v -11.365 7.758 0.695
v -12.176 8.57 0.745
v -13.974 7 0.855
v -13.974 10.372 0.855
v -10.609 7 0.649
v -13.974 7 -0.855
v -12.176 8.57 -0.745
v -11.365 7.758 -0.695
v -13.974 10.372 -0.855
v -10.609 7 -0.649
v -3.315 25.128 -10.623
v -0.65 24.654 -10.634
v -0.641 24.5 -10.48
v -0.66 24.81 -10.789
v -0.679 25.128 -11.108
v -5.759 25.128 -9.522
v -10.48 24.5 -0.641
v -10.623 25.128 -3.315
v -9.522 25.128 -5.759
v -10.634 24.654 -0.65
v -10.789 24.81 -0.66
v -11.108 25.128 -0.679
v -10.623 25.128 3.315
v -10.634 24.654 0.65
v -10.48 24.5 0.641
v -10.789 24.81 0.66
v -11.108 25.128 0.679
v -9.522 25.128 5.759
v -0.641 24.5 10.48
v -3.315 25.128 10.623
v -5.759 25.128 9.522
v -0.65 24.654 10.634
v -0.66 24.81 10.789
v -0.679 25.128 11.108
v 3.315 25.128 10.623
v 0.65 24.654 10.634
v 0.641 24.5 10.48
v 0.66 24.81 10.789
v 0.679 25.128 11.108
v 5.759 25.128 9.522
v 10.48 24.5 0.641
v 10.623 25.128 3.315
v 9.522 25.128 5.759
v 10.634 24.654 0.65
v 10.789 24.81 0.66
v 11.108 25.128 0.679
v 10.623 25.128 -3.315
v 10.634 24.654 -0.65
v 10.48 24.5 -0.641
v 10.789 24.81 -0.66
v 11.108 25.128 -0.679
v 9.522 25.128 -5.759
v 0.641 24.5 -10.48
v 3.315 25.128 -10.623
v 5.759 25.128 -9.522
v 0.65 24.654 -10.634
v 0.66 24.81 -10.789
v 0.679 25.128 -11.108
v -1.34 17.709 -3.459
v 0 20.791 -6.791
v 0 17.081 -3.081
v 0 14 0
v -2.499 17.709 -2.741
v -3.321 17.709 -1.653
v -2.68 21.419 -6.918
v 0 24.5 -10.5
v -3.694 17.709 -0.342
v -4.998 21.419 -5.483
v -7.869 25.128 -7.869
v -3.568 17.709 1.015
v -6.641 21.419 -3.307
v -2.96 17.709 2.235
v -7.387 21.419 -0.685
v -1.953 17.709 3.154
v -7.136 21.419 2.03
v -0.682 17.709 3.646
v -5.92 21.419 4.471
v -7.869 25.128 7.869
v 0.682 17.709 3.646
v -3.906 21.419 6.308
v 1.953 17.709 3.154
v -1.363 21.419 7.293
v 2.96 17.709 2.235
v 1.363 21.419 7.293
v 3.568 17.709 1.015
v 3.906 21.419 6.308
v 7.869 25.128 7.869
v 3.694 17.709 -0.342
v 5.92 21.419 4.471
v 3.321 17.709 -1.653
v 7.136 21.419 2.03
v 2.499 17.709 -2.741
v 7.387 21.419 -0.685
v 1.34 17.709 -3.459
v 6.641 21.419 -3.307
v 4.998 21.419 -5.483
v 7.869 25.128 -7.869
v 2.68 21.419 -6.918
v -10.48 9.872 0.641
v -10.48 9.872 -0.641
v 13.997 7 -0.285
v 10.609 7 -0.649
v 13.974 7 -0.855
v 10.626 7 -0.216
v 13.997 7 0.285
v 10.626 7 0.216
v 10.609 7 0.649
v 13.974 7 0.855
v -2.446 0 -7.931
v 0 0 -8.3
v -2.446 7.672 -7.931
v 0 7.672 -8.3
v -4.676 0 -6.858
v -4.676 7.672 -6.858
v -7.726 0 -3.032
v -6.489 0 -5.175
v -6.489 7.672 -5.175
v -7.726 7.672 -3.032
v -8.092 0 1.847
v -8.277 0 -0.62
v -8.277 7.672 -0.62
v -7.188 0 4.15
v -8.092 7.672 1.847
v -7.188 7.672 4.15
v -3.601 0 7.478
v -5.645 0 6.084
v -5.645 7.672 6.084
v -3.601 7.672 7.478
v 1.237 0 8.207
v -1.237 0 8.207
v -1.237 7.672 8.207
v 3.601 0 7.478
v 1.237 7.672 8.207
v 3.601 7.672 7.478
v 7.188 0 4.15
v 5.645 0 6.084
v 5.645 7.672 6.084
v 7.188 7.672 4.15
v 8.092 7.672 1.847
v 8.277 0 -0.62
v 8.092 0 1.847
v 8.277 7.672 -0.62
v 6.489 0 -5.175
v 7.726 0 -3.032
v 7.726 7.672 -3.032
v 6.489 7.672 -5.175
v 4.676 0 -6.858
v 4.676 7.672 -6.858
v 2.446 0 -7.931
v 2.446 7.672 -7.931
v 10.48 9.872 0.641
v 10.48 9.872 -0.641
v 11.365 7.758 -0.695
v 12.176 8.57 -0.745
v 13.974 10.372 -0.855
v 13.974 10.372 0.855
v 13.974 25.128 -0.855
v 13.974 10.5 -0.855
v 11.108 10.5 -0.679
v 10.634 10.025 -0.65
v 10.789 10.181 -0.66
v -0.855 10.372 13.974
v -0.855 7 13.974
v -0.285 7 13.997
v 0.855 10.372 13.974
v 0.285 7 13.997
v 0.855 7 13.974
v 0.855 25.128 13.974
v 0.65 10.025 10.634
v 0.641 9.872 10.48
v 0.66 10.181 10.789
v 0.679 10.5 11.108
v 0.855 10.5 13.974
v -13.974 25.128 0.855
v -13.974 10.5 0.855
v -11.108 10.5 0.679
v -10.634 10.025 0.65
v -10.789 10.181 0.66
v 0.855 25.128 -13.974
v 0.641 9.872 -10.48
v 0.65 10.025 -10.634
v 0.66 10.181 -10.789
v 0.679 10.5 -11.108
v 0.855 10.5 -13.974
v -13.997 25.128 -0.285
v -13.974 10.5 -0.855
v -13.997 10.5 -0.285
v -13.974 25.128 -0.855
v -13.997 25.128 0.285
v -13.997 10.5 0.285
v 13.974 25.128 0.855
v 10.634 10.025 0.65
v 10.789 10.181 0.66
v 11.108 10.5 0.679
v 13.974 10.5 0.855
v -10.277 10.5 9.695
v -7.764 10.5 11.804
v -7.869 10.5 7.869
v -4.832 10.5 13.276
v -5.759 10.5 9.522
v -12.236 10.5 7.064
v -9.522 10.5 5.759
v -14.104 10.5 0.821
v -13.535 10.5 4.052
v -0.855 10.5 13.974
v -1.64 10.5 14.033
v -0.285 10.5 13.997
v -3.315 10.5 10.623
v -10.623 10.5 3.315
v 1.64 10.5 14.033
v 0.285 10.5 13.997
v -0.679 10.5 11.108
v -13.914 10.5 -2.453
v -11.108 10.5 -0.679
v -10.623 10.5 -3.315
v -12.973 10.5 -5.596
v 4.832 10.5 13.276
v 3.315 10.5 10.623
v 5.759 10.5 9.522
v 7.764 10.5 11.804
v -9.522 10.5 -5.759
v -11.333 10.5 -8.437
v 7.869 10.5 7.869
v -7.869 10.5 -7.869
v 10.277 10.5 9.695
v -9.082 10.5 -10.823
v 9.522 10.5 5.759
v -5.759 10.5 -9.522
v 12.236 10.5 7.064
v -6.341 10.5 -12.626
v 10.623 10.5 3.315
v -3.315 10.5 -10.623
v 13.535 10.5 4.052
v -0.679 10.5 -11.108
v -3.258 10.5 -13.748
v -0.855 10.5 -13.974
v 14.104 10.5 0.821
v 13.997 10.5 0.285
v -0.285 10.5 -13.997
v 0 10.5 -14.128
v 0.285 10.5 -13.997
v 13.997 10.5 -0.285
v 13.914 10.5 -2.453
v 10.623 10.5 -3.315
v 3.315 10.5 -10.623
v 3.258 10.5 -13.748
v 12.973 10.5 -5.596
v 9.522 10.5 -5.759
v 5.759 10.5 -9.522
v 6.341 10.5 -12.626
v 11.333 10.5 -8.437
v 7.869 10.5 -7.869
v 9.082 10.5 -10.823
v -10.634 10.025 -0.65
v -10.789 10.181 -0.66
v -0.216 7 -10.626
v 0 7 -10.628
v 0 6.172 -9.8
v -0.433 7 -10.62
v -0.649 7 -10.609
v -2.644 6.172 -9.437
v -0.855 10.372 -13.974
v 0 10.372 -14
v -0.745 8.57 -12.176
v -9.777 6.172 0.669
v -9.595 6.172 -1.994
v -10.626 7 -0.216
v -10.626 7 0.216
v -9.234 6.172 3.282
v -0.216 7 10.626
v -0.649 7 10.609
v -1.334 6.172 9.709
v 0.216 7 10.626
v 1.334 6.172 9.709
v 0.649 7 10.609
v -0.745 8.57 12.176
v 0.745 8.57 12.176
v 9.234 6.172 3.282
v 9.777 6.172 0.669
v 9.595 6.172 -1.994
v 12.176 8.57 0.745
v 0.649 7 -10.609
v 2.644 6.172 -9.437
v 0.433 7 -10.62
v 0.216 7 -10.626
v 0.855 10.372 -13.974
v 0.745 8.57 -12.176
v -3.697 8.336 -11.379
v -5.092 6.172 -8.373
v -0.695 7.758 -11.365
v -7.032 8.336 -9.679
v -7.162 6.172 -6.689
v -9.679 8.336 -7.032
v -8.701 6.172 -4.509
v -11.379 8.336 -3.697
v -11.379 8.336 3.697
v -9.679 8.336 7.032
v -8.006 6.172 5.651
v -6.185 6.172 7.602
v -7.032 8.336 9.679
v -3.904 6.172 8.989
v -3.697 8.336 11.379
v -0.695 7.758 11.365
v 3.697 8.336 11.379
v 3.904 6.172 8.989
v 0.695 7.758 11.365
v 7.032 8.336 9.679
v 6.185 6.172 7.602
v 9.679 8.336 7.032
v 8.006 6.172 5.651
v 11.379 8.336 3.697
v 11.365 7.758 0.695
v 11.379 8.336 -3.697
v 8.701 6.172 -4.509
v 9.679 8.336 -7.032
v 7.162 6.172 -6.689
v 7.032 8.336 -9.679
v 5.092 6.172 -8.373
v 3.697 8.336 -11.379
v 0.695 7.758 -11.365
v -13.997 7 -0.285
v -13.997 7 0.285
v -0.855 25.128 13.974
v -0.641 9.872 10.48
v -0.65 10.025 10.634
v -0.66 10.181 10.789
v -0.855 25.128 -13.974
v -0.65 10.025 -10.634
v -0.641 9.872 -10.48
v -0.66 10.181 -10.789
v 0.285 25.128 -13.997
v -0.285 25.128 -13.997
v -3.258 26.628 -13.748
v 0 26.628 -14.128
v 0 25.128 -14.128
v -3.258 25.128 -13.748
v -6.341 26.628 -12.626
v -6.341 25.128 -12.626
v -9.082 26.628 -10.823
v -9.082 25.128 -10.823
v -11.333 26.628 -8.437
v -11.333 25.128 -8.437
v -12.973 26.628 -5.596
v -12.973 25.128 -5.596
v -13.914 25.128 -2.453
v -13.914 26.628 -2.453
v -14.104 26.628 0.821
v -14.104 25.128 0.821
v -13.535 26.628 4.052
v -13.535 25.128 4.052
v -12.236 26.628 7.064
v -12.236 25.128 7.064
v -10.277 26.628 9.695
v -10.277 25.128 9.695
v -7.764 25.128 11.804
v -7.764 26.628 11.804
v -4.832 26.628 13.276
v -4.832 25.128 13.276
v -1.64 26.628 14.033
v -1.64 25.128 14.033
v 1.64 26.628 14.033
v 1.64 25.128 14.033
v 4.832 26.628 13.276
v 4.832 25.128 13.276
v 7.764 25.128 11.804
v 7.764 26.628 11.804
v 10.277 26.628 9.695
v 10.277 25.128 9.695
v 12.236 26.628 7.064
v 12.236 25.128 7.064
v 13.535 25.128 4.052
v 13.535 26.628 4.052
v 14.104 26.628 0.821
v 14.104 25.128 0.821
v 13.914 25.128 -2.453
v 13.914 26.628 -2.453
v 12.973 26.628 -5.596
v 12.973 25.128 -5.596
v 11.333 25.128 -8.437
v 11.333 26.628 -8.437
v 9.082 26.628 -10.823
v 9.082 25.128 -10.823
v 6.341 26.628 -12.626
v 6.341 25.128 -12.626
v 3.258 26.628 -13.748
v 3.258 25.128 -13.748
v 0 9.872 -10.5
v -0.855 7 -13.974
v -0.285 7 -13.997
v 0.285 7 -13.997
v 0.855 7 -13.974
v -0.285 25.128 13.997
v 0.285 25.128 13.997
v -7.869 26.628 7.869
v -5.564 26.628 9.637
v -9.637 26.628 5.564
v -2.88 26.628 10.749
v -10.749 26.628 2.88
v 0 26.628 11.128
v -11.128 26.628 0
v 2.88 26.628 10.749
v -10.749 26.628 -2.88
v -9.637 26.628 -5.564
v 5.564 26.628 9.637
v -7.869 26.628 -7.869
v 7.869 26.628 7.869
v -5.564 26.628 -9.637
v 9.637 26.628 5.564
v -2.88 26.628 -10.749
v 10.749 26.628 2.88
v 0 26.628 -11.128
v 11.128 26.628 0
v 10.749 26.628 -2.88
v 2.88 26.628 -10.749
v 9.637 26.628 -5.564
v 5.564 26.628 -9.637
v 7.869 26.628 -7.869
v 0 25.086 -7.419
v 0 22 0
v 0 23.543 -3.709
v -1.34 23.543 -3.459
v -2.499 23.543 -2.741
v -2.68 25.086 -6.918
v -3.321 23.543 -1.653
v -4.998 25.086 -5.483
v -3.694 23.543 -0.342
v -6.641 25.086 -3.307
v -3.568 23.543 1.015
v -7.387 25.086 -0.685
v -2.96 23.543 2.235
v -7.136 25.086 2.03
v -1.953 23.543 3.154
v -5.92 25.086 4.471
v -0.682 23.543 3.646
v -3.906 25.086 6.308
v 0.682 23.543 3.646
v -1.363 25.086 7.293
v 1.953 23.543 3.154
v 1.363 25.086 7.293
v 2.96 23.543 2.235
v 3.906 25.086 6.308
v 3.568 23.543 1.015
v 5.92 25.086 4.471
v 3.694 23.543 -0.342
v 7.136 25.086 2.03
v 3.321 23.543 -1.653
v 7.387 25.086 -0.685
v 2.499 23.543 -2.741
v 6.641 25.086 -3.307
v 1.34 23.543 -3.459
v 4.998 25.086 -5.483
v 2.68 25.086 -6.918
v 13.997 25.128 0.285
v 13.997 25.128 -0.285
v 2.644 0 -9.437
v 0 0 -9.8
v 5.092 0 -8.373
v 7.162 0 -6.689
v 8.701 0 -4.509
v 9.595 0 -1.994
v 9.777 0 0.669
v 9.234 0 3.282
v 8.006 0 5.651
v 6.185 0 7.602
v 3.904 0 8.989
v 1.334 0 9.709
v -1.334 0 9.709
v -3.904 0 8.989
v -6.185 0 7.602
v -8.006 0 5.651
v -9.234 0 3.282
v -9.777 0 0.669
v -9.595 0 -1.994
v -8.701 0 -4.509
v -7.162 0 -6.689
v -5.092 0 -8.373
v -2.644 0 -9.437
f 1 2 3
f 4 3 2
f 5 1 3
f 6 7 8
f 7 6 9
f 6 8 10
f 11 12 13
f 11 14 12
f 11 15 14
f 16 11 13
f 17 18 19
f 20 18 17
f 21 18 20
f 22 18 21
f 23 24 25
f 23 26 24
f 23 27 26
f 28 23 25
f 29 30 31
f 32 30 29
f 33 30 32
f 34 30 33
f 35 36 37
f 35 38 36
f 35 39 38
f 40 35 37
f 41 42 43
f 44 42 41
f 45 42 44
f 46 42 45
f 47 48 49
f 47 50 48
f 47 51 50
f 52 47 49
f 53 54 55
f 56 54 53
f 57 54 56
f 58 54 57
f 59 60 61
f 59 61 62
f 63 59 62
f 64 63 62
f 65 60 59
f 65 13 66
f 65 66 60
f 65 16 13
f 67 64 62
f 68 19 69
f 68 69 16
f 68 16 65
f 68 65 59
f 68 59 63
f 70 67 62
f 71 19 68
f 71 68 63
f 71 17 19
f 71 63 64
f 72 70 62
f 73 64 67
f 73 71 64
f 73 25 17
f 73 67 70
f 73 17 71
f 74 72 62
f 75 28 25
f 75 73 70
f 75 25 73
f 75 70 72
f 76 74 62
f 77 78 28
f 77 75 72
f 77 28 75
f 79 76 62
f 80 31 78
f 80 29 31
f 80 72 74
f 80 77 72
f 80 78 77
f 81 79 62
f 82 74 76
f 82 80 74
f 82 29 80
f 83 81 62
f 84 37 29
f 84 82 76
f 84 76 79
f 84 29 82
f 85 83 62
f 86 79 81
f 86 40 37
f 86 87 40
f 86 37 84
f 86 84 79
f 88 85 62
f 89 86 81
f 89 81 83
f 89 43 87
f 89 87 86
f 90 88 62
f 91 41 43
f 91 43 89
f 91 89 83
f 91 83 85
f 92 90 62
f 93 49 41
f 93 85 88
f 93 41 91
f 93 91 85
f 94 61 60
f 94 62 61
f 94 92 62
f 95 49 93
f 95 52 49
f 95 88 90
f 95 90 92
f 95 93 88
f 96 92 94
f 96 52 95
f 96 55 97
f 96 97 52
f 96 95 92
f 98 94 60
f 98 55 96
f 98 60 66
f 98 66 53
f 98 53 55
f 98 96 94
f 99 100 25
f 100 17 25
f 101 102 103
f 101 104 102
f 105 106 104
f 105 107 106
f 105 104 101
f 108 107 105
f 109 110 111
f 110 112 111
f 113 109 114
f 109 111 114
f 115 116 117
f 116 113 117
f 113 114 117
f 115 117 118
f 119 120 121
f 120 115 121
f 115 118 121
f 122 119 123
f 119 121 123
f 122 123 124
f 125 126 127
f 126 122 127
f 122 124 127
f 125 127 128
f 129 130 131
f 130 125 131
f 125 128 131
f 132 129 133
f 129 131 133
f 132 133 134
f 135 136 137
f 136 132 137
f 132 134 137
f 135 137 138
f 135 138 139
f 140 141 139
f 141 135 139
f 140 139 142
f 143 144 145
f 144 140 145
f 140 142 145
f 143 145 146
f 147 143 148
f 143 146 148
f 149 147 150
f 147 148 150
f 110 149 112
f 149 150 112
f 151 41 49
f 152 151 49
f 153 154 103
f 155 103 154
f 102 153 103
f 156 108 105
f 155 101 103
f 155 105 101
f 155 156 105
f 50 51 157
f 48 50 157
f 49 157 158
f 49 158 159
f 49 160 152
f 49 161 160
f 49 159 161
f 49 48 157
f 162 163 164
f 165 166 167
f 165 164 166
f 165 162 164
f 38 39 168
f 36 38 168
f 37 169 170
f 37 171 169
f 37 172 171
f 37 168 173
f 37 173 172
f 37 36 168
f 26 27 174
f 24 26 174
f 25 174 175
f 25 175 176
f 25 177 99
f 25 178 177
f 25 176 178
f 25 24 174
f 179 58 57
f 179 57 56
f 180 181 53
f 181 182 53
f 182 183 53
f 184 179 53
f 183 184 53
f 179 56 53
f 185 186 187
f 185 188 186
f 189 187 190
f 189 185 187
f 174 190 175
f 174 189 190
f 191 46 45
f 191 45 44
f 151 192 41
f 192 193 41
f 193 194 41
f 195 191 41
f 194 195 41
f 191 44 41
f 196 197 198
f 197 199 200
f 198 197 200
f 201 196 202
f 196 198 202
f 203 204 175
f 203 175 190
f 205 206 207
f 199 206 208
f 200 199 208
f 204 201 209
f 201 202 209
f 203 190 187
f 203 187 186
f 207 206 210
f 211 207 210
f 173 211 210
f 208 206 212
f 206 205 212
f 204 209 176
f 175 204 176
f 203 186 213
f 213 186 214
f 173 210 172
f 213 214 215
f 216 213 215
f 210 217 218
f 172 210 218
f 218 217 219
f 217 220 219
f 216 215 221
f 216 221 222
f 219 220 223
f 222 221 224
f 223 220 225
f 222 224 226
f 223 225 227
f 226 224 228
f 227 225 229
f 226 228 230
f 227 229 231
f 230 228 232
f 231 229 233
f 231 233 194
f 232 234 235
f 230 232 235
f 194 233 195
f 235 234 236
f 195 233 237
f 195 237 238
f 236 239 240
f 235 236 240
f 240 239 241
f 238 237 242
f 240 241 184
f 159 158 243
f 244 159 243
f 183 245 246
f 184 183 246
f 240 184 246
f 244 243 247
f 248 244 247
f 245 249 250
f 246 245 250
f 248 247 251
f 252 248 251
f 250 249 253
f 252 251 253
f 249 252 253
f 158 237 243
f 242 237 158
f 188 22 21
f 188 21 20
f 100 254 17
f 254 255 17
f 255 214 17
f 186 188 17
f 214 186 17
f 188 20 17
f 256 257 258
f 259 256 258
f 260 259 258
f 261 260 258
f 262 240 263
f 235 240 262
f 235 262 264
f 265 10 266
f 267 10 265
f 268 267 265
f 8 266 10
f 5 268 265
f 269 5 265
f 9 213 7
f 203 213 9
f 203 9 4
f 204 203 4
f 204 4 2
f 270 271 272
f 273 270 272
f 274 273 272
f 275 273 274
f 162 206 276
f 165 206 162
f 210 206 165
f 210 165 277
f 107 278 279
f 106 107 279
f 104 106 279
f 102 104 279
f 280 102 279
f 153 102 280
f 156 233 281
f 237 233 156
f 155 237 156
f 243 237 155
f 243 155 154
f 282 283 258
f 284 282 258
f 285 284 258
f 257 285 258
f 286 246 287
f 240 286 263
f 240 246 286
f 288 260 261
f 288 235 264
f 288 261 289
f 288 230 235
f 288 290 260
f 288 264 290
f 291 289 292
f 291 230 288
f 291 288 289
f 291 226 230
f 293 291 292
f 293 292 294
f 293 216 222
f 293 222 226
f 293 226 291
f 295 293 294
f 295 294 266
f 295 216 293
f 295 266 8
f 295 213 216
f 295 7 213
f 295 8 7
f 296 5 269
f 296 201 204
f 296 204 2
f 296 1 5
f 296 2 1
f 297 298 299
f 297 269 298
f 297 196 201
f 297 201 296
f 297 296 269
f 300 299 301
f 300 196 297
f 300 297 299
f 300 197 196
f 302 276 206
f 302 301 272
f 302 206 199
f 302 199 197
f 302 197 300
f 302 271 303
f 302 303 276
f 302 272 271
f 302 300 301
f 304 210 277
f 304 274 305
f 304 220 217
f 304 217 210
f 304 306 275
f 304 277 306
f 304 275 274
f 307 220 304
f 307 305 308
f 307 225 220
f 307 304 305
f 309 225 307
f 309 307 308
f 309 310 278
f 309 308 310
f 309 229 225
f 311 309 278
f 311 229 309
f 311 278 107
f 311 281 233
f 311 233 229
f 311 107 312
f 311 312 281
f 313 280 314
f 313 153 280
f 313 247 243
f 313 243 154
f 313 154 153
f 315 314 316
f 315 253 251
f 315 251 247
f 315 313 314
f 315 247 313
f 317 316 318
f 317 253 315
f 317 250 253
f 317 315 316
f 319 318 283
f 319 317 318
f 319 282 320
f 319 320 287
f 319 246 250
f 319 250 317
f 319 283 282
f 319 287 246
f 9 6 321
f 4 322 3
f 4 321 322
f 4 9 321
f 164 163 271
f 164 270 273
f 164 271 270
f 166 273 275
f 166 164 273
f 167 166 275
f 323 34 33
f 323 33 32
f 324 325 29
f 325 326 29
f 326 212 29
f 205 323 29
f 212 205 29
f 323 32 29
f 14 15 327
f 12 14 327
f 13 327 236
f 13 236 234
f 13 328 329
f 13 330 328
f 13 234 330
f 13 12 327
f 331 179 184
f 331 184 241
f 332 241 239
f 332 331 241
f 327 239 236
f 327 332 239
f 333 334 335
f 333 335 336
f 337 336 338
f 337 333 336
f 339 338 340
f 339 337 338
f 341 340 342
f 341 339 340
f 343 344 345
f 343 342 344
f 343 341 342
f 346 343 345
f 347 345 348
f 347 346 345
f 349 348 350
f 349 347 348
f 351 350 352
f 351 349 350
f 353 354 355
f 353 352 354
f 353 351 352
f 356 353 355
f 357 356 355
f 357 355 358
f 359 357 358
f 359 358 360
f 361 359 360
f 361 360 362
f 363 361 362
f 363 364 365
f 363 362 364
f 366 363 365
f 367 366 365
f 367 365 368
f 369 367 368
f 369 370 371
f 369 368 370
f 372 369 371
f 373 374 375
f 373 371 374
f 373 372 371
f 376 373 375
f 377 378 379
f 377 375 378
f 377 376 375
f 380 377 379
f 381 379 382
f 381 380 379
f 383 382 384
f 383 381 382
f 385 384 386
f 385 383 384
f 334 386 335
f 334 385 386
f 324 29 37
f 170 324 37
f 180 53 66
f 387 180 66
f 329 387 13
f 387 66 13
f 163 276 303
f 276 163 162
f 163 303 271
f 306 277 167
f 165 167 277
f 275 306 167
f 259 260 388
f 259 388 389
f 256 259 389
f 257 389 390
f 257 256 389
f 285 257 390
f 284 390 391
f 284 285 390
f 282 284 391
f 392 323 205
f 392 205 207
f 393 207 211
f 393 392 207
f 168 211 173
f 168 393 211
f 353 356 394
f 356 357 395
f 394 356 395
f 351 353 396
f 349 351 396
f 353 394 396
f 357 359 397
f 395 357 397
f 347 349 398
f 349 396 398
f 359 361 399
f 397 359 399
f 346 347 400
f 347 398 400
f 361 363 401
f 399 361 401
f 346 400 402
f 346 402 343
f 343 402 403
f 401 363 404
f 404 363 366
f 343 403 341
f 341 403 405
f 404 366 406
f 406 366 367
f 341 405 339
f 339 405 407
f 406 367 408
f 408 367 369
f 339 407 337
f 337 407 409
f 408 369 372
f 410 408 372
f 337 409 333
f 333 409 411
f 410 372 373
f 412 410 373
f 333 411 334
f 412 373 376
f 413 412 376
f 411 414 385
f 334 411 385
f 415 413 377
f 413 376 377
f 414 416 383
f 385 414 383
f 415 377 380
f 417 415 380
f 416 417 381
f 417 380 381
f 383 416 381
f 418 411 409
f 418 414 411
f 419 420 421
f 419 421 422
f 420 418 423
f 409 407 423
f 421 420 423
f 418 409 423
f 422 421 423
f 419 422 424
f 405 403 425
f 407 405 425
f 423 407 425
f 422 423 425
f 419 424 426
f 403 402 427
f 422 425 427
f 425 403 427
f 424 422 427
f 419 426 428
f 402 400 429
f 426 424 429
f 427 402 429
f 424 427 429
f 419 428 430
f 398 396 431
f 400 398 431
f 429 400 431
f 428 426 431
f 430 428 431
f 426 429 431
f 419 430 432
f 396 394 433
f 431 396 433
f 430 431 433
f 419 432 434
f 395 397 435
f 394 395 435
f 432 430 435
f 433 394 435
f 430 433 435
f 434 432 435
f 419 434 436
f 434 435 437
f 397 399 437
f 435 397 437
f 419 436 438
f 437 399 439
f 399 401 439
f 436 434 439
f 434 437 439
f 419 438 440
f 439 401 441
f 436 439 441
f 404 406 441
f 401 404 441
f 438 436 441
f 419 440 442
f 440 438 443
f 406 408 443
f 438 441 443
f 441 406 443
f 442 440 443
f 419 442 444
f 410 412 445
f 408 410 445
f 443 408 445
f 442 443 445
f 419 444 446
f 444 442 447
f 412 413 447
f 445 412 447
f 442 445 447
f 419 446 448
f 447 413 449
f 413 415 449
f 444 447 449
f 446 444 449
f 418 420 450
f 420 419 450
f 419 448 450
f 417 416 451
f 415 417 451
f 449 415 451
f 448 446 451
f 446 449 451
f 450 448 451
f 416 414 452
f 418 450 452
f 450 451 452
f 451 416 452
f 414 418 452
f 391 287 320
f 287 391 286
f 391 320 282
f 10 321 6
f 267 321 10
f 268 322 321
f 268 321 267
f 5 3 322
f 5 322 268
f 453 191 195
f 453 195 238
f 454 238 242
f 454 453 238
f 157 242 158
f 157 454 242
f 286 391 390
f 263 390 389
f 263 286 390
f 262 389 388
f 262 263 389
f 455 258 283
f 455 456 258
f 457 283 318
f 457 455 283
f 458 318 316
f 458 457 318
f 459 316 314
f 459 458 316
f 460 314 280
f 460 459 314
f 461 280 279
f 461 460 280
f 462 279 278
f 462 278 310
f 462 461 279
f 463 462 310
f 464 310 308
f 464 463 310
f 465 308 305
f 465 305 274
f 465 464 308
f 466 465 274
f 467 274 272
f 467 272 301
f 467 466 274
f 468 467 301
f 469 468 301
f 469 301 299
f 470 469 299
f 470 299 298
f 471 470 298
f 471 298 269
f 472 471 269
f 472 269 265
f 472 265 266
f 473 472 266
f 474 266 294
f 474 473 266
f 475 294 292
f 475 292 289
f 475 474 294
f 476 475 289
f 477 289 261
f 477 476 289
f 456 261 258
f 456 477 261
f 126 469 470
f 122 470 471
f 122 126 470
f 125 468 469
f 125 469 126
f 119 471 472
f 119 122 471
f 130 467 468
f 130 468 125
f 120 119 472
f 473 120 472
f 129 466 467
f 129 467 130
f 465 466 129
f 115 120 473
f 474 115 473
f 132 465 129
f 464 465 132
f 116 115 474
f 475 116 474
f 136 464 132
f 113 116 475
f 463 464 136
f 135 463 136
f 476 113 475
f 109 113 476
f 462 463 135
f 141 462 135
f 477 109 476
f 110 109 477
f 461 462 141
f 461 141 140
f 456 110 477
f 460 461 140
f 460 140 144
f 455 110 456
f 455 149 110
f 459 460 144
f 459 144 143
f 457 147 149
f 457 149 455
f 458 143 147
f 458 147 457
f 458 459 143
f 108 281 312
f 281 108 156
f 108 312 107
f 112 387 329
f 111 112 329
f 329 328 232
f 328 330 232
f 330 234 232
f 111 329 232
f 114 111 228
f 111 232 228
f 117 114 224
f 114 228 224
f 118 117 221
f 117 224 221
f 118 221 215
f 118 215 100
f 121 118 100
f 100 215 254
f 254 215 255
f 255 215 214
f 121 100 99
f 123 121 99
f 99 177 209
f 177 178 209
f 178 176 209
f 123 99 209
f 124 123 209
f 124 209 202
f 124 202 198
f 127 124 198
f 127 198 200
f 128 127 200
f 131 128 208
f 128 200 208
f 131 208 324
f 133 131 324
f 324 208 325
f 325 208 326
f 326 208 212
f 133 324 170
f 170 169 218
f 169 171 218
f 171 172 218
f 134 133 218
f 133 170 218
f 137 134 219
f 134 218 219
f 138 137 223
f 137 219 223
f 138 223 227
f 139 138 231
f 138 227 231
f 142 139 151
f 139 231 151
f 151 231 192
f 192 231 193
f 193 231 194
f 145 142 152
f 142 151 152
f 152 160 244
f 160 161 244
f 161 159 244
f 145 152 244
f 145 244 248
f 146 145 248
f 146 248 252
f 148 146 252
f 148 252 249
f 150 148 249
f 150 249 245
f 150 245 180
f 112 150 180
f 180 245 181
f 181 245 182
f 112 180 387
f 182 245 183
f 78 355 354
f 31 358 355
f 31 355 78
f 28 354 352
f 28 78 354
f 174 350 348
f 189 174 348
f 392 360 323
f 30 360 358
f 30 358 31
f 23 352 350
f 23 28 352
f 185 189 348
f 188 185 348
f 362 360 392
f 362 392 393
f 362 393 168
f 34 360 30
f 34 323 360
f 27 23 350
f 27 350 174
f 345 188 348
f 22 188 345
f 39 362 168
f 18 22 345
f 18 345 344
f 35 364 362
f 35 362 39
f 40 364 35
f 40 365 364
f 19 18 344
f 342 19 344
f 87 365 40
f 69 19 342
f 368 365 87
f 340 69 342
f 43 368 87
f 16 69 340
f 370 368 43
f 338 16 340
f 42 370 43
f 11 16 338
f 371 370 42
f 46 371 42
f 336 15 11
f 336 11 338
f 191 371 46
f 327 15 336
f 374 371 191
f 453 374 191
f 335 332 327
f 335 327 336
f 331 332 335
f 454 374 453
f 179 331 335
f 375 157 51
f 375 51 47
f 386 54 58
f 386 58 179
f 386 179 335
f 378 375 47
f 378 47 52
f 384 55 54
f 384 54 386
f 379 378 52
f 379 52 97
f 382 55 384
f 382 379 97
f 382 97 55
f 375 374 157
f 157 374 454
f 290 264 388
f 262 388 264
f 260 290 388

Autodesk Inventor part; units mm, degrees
ref_plane "YZ Plane" through (0, 0, 0) normal (1, 0, 0) x (0, 1, 0)
ref_plane "XZ Plane" through (0, 0, 0) normal (0, 1, 0) x (-1, 0, 0)
ref_plane "XY Plane" through (0, 0, 0) normal (0, 0, 1) x (1, 0, 0)
sketch "Sketch1" plane through (0, 0, 0) normal (1, 0, 0) x (0, 1, 0)
  line L0 (0, -8.3) -> (7.6716, -8.3)
  line L1 (14, 0) -> (0, 0) construction
  line L2 (0, 0) -> (0, -8.3) construction
  line L3 (6.1716, -9.8) -> (0, -9.8)
  line L4 (0, -8.3) -> (0, -9.8)
  line L5 (25.1284, -11.1284) -> (25.1284, -14.1284)
  line L6 (25.1284, -14.1284) -> (26.6284, -14.1284)
  line L7 (14, 0) -> (22, 0)
  line L8 (25.1284, -11.1284) -> (14, 0)
  line L9 (26.6284, -14.1284) -> (26.6284, -11.1284)
  line L10 (26.6284, -11.1284) -> (22, 0)
  line L11 (7.6716, -8.3) -> (10.5, -11.1284)
  line L12 (10.5, -11.1284) -> (10.5, -14.1284)
  line L13 (10.5, -14.1284) -> (6.1716, -9.8)
  line L14 (25.1284, -11.1284) -> (10.5, -11.1284) construction
  dimension "d2" = 14
  dimension "d3" = 8.3
  dimension "d9" = 1.5
  dimension "d71" = 1.5
  dimension "d72" = 3
  dimension "d74" = 8
  dimension "d170" = 3
  dimension "d171" = 4
  dimension "d172" = 135
  dimension "d176" = 3.5
revolve "Revolution3" add sketch "Sketch1" angle 360 about axis through (0, 14, 0) along (0, -1, 0)
ref_plane "Work Plane2" through (0, 21.25, 0) normal (0, -1, 0) x (1, 0, 0)
sketch "Sketch13" plane through (0, 21.25, 0) normal (0, -1, 0) x (1, 0, 0)
  arc A0 (-13.9739, 0.8547) -> (-13.9739, -0.8547) centre (0, 0) ccw
  line L0 (0, 0) -> (-13.9739, -0.8547) construction
  line L1 (0, 0) -> (14, 0) construction
  line L2 (0, 0) -> (-13.9739, 0.8547) construction
  arc A1 (-10.4804, 0.641) -> (-10.4804, -0.641) centre (0, 0) ccw
  line L3 (0, 0) -> (-10.4804, 0.641) construction
  line L4 (0, 0) -> (-10.4804, -0.641) construction
  line L5 (-13.9739, -0.8547) -> (-10.4804, -0.641)
  line L6 (-13.9739, 0.8547) -> (-10.4804, 0.641)
  line L7 (0, 2.675) -> (0, -2.675)
  arc A2 (13.9739, -0.8547) -> (13.9739, 0.8547) centre (0, 0) ccw
  arc A3 (10.4804, -0.641) -> (10.4804, 0.641) centre (0, 0) ccw
  line L8 (13.9739, -0.8547) -> (10.4804, -0.641)
  line L9 (13.9739, 0.8547) -> (10.4804, 0.641)
  line L10 (-1.7678, 1.7678) -> (1.7678, -1.7678)
  line L11 (-1.7678, 1.7678) -> (3.2322, 1.7678) construction
  arc A4 (0.8547, 13.9739) -> (-0.8547, 13.9739) centre (0, 0) ccw
  arc A5 (0.641, 10.4804) -> (-0.641, 10.4804) centre (0, 0) ccw
  line L12 (0.8547, 13.9739) -> (0.641, 10.4804)
  line L13 (-0.8547, 13.9739) -> (-0.641, 10.4804)
  arc A6 (-0.8547, -13.9739) -> (0.8547, -13.9739) centre (0, 0) ccw
  arc A7 (-0.641, -10.4804) -> (0.641, -10.4804) centre (0, 0) ccw
  line L14 (-0.8547, -13.9739) -> (-0.641, -10.4804)
  line L15 (0.8547, -13.9739) -> (0.641, -10.4804)
  point P0 (0, 0)
  dimension "d150" = 14
  dimension "d151" = 176.5
  dimension "d152" = 7
  dimension "d153" = 10.5
  dimension "d154" = 7
  dimension "d155" = 5.35
  dimension "d156" = 5
  dimension "d157" = 45
extrude "Extrusion7" add sketch "Sketch13" along normal blind 14.25 and the other way blind 4.75
properties part number "soundconev4"
